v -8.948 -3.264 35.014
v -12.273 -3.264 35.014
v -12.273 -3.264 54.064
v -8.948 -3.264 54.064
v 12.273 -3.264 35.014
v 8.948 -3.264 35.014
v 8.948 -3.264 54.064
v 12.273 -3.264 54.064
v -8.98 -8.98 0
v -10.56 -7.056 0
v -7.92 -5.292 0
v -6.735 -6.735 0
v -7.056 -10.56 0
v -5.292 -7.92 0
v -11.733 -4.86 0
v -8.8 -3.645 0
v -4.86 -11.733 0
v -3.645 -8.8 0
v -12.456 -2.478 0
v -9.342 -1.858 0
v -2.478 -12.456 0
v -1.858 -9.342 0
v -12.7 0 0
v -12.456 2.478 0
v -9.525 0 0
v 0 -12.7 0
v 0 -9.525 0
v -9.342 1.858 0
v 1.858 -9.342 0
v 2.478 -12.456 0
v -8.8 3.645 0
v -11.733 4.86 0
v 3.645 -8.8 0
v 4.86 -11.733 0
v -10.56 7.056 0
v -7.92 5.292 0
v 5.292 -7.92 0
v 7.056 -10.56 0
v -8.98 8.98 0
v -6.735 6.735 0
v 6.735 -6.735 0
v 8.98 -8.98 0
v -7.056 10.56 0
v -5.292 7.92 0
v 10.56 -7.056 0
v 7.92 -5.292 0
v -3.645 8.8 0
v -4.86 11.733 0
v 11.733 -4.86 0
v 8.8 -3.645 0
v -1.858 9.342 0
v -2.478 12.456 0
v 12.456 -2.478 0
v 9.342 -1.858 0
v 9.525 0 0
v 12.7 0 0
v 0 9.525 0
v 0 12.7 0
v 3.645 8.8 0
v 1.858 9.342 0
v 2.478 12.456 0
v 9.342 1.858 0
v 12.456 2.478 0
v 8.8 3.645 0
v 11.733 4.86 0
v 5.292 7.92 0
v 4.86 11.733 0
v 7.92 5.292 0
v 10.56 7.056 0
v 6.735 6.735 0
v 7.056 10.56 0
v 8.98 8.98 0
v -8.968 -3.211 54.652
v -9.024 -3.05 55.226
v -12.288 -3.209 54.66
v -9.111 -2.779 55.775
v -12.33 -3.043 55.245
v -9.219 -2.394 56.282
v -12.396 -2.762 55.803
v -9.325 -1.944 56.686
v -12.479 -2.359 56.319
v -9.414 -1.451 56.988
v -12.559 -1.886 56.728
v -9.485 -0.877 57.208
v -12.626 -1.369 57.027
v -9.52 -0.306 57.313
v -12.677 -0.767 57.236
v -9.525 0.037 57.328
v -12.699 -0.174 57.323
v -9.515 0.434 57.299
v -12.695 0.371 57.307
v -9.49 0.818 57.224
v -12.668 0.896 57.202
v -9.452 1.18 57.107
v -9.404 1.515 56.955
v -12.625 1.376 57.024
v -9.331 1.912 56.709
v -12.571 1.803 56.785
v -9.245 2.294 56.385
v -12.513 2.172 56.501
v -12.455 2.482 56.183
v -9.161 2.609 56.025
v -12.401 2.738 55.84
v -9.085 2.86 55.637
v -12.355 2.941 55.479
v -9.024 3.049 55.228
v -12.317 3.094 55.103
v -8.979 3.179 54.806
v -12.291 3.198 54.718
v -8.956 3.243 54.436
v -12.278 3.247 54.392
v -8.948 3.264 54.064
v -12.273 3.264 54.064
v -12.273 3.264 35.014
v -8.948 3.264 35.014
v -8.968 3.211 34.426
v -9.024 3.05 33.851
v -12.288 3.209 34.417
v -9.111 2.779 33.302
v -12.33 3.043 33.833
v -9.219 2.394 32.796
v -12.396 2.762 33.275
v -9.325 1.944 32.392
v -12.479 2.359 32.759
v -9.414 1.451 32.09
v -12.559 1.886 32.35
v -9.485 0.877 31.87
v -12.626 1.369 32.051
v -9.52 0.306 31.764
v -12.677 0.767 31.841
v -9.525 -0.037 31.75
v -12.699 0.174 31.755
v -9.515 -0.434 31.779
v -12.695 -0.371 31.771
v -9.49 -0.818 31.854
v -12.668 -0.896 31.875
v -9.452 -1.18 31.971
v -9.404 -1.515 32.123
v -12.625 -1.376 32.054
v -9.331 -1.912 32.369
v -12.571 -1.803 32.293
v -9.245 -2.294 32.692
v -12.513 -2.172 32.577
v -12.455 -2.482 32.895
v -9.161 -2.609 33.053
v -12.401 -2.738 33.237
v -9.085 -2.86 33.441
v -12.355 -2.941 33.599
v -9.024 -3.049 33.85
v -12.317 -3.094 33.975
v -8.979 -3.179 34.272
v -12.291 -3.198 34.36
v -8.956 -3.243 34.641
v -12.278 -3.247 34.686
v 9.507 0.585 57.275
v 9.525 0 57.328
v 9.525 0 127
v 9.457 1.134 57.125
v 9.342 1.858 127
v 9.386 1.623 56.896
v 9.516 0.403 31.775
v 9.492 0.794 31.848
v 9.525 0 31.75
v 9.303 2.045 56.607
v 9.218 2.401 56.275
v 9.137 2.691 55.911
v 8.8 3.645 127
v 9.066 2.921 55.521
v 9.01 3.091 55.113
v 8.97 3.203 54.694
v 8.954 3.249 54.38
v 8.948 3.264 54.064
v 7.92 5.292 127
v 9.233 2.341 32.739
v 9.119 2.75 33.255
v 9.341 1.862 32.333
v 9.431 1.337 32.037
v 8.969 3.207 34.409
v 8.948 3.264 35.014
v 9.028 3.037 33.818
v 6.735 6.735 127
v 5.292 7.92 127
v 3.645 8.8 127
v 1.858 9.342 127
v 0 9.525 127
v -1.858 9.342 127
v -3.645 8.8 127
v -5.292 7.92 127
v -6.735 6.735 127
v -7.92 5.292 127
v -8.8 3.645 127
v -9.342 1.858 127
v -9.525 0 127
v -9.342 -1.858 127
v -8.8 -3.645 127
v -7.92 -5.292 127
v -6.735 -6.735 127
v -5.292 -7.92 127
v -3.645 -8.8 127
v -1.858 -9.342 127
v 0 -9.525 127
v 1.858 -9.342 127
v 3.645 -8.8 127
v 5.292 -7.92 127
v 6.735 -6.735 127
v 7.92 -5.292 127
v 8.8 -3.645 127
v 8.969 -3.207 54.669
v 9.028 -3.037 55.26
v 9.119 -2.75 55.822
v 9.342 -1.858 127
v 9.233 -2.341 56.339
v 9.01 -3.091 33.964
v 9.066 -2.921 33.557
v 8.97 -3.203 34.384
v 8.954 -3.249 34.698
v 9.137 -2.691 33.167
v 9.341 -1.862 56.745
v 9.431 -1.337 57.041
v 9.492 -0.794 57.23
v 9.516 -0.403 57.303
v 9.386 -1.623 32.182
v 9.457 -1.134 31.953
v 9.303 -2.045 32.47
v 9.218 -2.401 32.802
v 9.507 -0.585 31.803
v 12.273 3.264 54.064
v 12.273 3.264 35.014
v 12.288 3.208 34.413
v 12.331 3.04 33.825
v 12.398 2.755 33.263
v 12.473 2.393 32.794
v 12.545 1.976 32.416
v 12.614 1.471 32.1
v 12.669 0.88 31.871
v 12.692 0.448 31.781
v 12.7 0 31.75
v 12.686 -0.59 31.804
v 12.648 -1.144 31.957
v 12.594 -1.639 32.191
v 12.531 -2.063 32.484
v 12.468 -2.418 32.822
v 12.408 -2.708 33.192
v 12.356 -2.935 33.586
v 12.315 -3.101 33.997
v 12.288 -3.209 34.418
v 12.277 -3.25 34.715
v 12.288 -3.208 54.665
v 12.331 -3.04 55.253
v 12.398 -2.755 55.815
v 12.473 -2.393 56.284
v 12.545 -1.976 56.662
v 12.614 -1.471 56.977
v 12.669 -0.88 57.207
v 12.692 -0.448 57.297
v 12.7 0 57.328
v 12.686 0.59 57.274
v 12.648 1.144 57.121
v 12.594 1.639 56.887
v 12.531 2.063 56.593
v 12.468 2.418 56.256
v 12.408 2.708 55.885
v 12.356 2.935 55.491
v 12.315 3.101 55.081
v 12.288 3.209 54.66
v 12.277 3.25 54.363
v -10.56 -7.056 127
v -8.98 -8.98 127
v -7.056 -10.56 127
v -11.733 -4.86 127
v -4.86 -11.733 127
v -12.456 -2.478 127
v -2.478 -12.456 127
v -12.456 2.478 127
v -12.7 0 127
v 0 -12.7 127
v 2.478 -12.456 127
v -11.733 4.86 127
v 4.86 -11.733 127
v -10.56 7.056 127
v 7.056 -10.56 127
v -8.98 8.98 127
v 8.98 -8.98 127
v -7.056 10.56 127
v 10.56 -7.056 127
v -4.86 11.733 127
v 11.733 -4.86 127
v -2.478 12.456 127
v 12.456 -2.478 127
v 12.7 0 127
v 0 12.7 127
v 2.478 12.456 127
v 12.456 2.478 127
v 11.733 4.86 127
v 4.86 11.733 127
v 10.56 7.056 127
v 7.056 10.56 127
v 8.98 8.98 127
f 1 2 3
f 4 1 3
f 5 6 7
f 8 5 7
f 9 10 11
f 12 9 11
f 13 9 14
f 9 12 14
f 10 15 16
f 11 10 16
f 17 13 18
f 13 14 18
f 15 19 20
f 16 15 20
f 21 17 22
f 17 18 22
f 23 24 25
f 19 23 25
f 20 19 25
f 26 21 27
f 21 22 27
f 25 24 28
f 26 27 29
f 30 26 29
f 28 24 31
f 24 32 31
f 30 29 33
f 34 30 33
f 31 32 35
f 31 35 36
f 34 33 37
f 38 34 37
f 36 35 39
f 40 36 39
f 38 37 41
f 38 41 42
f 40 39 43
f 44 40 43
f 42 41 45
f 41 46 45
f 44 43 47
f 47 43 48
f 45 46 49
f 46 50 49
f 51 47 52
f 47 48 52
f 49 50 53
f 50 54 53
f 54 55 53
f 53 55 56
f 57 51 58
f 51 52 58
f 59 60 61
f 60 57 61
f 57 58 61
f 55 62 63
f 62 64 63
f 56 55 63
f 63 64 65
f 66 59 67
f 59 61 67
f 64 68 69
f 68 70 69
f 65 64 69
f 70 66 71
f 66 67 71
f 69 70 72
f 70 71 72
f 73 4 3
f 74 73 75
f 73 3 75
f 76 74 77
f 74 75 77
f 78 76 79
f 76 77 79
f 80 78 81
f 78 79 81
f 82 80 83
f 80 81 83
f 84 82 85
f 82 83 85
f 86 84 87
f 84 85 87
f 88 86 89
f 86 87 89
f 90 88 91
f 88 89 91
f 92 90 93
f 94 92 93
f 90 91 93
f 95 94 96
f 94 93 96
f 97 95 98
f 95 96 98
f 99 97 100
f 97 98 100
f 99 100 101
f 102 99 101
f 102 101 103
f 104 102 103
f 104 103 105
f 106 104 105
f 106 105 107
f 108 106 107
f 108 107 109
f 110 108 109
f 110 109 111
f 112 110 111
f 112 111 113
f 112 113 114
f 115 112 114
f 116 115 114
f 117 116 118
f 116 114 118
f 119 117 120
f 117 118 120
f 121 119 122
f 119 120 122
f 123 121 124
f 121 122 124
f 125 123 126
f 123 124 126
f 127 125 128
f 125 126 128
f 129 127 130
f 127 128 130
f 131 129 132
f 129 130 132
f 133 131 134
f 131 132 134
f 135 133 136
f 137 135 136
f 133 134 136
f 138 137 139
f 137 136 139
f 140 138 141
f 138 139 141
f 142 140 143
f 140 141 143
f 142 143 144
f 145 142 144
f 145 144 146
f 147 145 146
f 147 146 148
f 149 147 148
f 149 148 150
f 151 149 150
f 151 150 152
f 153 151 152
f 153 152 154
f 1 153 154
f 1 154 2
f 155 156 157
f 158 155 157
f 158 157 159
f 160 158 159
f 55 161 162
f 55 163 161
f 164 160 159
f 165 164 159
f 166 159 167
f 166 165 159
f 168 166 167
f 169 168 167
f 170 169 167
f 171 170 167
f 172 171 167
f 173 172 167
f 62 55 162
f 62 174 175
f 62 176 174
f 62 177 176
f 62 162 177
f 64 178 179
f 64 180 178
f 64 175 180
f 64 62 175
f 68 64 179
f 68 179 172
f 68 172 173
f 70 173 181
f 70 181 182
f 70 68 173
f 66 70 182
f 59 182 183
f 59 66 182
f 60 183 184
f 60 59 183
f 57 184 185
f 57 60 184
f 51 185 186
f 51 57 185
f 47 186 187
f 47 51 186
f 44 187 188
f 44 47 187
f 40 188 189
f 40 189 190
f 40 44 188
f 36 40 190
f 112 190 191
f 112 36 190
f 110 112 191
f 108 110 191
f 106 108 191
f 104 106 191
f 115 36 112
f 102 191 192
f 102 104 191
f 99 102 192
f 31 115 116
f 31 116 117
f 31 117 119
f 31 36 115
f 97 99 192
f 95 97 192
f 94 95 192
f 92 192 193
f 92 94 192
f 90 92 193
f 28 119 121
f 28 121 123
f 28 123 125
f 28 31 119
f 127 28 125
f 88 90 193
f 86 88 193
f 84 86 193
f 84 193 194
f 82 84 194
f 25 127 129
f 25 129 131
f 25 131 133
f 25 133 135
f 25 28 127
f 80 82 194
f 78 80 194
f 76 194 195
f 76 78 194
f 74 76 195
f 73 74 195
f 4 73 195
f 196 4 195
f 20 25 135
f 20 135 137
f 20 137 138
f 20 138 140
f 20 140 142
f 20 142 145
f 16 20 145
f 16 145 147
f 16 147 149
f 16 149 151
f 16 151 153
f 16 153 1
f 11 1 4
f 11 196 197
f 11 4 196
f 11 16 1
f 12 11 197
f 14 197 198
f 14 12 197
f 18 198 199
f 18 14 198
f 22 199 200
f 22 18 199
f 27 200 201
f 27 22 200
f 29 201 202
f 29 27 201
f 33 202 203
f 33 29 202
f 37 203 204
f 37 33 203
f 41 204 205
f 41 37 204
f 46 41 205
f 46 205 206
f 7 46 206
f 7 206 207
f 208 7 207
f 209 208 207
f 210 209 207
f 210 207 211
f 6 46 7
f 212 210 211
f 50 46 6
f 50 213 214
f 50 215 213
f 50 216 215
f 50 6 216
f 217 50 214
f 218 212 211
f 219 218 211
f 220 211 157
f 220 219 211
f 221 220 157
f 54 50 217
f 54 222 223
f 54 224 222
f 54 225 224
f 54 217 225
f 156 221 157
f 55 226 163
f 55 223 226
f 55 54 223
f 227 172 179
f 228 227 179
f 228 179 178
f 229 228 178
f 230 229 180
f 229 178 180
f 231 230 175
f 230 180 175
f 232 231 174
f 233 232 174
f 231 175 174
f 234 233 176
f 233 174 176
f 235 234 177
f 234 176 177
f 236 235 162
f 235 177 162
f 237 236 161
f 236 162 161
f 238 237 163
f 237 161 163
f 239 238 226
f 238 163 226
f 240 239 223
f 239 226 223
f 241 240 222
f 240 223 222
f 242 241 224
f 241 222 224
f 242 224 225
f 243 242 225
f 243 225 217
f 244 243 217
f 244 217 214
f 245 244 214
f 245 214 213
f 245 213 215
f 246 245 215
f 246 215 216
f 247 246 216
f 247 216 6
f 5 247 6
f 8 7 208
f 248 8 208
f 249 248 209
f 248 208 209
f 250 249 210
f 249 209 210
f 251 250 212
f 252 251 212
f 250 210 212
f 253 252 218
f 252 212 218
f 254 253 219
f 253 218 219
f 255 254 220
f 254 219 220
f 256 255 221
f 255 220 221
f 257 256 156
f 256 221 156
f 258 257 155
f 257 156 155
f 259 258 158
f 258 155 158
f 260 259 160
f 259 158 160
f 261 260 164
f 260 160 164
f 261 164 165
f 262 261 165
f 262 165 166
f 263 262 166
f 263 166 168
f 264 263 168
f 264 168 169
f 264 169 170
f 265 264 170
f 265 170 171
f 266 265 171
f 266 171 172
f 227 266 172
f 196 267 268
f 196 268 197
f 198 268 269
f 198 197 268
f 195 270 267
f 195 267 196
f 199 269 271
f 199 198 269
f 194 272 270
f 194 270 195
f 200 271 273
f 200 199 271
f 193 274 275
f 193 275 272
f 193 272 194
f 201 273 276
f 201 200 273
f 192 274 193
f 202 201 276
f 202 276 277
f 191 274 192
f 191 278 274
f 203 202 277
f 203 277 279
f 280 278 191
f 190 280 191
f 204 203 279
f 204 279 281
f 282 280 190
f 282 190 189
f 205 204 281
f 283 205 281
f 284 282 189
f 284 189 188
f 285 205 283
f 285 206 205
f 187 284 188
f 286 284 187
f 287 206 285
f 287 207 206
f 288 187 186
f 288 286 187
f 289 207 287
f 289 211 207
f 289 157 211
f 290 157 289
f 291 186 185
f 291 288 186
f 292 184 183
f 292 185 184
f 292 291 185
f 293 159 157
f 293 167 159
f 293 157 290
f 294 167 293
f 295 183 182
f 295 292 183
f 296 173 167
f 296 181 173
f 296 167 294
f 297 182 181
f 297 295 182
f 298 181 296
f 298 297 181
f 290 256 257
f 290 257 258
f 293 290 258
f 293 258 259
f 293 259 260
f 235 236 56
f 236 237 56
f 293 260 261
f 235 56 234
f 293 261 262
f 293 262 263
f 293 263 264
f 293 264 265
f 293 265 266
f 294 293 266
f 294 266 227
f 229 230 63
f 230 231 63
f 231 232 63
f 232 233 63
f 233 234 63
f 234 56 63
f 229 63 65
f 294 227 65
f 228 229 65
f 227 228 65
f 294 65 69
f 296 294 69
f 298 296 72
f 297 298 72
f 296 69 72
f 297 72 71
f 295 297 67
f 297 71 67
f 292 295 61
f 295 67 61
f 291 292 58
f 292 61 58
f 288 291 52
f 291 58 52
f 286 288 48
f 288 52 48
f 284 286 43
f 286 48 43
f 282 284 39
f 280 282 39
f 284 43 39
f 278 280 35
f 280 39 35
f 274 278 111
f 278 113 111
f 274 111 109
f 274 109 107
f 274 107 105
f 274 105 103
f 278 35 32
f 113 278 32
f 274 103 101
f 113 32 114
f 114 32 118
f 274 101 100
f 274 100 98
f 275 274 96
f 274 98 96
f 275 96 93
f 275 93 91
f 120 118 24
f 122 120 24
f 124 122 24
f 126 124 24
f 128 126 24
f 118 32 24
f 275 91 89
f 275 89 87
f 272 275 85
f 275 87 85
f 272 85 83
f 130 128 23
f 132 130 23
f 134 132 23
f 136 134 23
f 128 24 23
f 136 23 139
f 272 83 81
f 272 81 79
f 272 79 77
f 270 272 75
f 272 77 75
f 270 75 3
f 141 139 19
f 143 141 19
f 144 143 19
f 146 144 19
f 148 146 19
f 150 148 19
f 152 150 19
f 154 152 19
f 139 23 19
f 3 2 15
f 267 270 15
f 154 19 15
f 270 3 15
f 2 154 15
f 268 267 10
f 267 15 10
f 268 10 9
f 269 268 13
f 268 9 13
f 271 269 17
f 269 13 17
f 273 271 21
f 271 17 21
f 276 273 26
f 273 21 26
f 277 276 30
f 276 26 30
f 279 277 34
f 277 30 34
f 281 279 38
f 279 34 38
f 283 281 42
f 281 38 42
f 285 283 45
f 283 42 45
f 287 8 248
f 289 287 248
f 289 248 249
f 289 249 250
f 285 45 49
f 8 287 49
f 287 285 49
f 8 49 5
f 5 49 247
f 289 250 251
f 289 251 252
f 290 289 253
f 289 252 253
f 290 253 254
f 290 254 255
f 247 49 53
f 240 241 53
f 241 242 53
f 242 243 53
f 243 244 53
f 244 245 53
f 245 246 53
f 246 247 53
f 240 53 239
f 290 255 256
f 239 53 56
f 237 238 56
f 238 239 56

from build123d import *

# Parameters (mm, degrees)
SKETCH1_R               = 12.7
SKETCH1_R_2             = 9.525
BOSS_EXTRUDE1_DEPTH     = 127
CUT_EXTRUDE1_DEPTH      = 129.263712717
CUT_EXTRUDE1_DEPTH_BACK = 129.263712717


with BuildPart() as part:
    # Sketch1 → Boss-Extrude1 (new body)
    with BuildSketch(Plane.XY):
        Circle(SKETCH1_R)
        Circle(SKETCH1_R_2, mode=Mode.SUBTRACT)
    extrude(amount=BOSS_EXTRUDE1_DEPTH)

    # Sketch2 → Cut-Extrude1 (cut, two sides: drawn at the far end of the back side and taken through both)
    with BuildSketch(Plane(origin=(0, 0, 0), x_dir=(0, 0, -1), z_dir=(1, 0, 0)).offset(-CUT_EXTRUDE1_DEPTH_BACK)):
        with BuildLine():
            Line((-35.0139, -3.2639), (-54.0639, -3.2639))
            ThreePointArc((-54.0639, -3.2639), (-57.3278, 0), (-54.0639, 3.2639))
            Line((-54.0639, 3.2639), (-35.0139, 3.2639))
            ThreePointArc((-35.0139, 3.2639), (-31.75, 0), (-35.0139, -3.2639))
        make_face()
    extrude(amount=CUT_EXTRUDE1_DEPTH + CUT_EXTRUDE1_DEPTH_BACK, mode=Mode.SUBTRACT)


solid = part.part
